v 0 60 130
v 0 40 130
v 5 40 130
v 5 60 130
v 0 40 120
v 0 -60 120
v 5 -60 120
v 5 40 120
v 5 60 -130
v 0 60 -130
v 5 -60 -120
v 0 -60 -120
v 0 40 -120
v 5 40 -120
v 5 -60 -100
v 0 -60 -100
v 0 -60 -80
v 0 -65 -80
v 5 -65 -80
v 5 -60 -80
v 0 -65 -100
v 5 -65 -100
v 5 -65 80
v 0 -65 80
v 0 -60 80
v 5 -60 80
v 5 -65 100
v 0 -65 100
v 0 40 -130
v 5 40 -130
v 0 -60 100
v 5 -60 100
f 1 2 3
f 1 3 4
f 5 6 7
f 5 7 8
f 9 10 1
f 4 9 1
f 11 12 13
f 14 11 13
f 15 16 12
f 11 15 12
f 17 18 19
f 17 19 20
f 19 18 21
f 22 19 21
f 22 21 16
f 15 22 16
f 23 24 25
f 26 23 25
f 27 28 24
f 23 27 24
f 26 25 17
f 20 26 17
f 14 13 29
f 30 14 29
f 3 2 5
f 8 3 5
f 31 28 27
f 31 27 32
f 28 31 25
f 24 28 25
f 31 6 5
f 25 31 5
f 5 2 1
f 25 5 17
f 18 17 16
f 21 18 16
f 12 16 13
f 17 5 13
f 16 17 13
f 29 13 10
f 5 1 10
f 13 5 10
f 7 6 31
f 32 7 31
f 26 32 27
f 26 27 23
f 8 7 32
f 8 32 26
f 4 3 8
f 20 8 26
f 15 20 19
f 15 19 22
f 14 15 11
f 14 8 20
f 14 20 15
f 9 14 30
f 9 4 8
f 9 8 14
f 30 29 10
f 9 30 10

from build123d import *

# Parameters (mm, degrees)
SKIZZE2_W                       = 240
SKIZZE2_H                       = 120
SKIZZE2_W_2                     = 10
SKIZZE2_H_2                     = 20
SKIZZE2_W_3                     = 20
SKIZZE2_H_3                     = 5
AUFSATZ_LINEAR_AUSTRAGEN1_DEPTH = 5


with BuildPart() as part:
    # Skizze2 → Aufsatz-Linear austragen1 (new body)
    with BuildSketch(Plane(origin=(0, 0, 0), x_dir=(0, 0, -1), z_dir=(1, 0, 0))):
        Rectangle(SKIZZE2_W, SKIZZE2_H)
        with Locations((-125, 50)):
            Rectangle(SKIZZE2_W_2, SKIZZE2_H_2)
        with Locations((125, 50)):
            Rectangle(SKIZZE2_W_2, SKIZZE2_H_2)
        with Locations((-90, -62.5)):
            Rectangle(SKIZZE2_W_3, SKIZZE2_H_3)
        with Locations((90, -62.5)):
            Rectangle(SKIZZE2_W_3, SKIZZE2_H_3)
    extrude(amount=AUFSATZ_LINEAR_AUSTRAGEN1_DEPTH)


solid = part.part
